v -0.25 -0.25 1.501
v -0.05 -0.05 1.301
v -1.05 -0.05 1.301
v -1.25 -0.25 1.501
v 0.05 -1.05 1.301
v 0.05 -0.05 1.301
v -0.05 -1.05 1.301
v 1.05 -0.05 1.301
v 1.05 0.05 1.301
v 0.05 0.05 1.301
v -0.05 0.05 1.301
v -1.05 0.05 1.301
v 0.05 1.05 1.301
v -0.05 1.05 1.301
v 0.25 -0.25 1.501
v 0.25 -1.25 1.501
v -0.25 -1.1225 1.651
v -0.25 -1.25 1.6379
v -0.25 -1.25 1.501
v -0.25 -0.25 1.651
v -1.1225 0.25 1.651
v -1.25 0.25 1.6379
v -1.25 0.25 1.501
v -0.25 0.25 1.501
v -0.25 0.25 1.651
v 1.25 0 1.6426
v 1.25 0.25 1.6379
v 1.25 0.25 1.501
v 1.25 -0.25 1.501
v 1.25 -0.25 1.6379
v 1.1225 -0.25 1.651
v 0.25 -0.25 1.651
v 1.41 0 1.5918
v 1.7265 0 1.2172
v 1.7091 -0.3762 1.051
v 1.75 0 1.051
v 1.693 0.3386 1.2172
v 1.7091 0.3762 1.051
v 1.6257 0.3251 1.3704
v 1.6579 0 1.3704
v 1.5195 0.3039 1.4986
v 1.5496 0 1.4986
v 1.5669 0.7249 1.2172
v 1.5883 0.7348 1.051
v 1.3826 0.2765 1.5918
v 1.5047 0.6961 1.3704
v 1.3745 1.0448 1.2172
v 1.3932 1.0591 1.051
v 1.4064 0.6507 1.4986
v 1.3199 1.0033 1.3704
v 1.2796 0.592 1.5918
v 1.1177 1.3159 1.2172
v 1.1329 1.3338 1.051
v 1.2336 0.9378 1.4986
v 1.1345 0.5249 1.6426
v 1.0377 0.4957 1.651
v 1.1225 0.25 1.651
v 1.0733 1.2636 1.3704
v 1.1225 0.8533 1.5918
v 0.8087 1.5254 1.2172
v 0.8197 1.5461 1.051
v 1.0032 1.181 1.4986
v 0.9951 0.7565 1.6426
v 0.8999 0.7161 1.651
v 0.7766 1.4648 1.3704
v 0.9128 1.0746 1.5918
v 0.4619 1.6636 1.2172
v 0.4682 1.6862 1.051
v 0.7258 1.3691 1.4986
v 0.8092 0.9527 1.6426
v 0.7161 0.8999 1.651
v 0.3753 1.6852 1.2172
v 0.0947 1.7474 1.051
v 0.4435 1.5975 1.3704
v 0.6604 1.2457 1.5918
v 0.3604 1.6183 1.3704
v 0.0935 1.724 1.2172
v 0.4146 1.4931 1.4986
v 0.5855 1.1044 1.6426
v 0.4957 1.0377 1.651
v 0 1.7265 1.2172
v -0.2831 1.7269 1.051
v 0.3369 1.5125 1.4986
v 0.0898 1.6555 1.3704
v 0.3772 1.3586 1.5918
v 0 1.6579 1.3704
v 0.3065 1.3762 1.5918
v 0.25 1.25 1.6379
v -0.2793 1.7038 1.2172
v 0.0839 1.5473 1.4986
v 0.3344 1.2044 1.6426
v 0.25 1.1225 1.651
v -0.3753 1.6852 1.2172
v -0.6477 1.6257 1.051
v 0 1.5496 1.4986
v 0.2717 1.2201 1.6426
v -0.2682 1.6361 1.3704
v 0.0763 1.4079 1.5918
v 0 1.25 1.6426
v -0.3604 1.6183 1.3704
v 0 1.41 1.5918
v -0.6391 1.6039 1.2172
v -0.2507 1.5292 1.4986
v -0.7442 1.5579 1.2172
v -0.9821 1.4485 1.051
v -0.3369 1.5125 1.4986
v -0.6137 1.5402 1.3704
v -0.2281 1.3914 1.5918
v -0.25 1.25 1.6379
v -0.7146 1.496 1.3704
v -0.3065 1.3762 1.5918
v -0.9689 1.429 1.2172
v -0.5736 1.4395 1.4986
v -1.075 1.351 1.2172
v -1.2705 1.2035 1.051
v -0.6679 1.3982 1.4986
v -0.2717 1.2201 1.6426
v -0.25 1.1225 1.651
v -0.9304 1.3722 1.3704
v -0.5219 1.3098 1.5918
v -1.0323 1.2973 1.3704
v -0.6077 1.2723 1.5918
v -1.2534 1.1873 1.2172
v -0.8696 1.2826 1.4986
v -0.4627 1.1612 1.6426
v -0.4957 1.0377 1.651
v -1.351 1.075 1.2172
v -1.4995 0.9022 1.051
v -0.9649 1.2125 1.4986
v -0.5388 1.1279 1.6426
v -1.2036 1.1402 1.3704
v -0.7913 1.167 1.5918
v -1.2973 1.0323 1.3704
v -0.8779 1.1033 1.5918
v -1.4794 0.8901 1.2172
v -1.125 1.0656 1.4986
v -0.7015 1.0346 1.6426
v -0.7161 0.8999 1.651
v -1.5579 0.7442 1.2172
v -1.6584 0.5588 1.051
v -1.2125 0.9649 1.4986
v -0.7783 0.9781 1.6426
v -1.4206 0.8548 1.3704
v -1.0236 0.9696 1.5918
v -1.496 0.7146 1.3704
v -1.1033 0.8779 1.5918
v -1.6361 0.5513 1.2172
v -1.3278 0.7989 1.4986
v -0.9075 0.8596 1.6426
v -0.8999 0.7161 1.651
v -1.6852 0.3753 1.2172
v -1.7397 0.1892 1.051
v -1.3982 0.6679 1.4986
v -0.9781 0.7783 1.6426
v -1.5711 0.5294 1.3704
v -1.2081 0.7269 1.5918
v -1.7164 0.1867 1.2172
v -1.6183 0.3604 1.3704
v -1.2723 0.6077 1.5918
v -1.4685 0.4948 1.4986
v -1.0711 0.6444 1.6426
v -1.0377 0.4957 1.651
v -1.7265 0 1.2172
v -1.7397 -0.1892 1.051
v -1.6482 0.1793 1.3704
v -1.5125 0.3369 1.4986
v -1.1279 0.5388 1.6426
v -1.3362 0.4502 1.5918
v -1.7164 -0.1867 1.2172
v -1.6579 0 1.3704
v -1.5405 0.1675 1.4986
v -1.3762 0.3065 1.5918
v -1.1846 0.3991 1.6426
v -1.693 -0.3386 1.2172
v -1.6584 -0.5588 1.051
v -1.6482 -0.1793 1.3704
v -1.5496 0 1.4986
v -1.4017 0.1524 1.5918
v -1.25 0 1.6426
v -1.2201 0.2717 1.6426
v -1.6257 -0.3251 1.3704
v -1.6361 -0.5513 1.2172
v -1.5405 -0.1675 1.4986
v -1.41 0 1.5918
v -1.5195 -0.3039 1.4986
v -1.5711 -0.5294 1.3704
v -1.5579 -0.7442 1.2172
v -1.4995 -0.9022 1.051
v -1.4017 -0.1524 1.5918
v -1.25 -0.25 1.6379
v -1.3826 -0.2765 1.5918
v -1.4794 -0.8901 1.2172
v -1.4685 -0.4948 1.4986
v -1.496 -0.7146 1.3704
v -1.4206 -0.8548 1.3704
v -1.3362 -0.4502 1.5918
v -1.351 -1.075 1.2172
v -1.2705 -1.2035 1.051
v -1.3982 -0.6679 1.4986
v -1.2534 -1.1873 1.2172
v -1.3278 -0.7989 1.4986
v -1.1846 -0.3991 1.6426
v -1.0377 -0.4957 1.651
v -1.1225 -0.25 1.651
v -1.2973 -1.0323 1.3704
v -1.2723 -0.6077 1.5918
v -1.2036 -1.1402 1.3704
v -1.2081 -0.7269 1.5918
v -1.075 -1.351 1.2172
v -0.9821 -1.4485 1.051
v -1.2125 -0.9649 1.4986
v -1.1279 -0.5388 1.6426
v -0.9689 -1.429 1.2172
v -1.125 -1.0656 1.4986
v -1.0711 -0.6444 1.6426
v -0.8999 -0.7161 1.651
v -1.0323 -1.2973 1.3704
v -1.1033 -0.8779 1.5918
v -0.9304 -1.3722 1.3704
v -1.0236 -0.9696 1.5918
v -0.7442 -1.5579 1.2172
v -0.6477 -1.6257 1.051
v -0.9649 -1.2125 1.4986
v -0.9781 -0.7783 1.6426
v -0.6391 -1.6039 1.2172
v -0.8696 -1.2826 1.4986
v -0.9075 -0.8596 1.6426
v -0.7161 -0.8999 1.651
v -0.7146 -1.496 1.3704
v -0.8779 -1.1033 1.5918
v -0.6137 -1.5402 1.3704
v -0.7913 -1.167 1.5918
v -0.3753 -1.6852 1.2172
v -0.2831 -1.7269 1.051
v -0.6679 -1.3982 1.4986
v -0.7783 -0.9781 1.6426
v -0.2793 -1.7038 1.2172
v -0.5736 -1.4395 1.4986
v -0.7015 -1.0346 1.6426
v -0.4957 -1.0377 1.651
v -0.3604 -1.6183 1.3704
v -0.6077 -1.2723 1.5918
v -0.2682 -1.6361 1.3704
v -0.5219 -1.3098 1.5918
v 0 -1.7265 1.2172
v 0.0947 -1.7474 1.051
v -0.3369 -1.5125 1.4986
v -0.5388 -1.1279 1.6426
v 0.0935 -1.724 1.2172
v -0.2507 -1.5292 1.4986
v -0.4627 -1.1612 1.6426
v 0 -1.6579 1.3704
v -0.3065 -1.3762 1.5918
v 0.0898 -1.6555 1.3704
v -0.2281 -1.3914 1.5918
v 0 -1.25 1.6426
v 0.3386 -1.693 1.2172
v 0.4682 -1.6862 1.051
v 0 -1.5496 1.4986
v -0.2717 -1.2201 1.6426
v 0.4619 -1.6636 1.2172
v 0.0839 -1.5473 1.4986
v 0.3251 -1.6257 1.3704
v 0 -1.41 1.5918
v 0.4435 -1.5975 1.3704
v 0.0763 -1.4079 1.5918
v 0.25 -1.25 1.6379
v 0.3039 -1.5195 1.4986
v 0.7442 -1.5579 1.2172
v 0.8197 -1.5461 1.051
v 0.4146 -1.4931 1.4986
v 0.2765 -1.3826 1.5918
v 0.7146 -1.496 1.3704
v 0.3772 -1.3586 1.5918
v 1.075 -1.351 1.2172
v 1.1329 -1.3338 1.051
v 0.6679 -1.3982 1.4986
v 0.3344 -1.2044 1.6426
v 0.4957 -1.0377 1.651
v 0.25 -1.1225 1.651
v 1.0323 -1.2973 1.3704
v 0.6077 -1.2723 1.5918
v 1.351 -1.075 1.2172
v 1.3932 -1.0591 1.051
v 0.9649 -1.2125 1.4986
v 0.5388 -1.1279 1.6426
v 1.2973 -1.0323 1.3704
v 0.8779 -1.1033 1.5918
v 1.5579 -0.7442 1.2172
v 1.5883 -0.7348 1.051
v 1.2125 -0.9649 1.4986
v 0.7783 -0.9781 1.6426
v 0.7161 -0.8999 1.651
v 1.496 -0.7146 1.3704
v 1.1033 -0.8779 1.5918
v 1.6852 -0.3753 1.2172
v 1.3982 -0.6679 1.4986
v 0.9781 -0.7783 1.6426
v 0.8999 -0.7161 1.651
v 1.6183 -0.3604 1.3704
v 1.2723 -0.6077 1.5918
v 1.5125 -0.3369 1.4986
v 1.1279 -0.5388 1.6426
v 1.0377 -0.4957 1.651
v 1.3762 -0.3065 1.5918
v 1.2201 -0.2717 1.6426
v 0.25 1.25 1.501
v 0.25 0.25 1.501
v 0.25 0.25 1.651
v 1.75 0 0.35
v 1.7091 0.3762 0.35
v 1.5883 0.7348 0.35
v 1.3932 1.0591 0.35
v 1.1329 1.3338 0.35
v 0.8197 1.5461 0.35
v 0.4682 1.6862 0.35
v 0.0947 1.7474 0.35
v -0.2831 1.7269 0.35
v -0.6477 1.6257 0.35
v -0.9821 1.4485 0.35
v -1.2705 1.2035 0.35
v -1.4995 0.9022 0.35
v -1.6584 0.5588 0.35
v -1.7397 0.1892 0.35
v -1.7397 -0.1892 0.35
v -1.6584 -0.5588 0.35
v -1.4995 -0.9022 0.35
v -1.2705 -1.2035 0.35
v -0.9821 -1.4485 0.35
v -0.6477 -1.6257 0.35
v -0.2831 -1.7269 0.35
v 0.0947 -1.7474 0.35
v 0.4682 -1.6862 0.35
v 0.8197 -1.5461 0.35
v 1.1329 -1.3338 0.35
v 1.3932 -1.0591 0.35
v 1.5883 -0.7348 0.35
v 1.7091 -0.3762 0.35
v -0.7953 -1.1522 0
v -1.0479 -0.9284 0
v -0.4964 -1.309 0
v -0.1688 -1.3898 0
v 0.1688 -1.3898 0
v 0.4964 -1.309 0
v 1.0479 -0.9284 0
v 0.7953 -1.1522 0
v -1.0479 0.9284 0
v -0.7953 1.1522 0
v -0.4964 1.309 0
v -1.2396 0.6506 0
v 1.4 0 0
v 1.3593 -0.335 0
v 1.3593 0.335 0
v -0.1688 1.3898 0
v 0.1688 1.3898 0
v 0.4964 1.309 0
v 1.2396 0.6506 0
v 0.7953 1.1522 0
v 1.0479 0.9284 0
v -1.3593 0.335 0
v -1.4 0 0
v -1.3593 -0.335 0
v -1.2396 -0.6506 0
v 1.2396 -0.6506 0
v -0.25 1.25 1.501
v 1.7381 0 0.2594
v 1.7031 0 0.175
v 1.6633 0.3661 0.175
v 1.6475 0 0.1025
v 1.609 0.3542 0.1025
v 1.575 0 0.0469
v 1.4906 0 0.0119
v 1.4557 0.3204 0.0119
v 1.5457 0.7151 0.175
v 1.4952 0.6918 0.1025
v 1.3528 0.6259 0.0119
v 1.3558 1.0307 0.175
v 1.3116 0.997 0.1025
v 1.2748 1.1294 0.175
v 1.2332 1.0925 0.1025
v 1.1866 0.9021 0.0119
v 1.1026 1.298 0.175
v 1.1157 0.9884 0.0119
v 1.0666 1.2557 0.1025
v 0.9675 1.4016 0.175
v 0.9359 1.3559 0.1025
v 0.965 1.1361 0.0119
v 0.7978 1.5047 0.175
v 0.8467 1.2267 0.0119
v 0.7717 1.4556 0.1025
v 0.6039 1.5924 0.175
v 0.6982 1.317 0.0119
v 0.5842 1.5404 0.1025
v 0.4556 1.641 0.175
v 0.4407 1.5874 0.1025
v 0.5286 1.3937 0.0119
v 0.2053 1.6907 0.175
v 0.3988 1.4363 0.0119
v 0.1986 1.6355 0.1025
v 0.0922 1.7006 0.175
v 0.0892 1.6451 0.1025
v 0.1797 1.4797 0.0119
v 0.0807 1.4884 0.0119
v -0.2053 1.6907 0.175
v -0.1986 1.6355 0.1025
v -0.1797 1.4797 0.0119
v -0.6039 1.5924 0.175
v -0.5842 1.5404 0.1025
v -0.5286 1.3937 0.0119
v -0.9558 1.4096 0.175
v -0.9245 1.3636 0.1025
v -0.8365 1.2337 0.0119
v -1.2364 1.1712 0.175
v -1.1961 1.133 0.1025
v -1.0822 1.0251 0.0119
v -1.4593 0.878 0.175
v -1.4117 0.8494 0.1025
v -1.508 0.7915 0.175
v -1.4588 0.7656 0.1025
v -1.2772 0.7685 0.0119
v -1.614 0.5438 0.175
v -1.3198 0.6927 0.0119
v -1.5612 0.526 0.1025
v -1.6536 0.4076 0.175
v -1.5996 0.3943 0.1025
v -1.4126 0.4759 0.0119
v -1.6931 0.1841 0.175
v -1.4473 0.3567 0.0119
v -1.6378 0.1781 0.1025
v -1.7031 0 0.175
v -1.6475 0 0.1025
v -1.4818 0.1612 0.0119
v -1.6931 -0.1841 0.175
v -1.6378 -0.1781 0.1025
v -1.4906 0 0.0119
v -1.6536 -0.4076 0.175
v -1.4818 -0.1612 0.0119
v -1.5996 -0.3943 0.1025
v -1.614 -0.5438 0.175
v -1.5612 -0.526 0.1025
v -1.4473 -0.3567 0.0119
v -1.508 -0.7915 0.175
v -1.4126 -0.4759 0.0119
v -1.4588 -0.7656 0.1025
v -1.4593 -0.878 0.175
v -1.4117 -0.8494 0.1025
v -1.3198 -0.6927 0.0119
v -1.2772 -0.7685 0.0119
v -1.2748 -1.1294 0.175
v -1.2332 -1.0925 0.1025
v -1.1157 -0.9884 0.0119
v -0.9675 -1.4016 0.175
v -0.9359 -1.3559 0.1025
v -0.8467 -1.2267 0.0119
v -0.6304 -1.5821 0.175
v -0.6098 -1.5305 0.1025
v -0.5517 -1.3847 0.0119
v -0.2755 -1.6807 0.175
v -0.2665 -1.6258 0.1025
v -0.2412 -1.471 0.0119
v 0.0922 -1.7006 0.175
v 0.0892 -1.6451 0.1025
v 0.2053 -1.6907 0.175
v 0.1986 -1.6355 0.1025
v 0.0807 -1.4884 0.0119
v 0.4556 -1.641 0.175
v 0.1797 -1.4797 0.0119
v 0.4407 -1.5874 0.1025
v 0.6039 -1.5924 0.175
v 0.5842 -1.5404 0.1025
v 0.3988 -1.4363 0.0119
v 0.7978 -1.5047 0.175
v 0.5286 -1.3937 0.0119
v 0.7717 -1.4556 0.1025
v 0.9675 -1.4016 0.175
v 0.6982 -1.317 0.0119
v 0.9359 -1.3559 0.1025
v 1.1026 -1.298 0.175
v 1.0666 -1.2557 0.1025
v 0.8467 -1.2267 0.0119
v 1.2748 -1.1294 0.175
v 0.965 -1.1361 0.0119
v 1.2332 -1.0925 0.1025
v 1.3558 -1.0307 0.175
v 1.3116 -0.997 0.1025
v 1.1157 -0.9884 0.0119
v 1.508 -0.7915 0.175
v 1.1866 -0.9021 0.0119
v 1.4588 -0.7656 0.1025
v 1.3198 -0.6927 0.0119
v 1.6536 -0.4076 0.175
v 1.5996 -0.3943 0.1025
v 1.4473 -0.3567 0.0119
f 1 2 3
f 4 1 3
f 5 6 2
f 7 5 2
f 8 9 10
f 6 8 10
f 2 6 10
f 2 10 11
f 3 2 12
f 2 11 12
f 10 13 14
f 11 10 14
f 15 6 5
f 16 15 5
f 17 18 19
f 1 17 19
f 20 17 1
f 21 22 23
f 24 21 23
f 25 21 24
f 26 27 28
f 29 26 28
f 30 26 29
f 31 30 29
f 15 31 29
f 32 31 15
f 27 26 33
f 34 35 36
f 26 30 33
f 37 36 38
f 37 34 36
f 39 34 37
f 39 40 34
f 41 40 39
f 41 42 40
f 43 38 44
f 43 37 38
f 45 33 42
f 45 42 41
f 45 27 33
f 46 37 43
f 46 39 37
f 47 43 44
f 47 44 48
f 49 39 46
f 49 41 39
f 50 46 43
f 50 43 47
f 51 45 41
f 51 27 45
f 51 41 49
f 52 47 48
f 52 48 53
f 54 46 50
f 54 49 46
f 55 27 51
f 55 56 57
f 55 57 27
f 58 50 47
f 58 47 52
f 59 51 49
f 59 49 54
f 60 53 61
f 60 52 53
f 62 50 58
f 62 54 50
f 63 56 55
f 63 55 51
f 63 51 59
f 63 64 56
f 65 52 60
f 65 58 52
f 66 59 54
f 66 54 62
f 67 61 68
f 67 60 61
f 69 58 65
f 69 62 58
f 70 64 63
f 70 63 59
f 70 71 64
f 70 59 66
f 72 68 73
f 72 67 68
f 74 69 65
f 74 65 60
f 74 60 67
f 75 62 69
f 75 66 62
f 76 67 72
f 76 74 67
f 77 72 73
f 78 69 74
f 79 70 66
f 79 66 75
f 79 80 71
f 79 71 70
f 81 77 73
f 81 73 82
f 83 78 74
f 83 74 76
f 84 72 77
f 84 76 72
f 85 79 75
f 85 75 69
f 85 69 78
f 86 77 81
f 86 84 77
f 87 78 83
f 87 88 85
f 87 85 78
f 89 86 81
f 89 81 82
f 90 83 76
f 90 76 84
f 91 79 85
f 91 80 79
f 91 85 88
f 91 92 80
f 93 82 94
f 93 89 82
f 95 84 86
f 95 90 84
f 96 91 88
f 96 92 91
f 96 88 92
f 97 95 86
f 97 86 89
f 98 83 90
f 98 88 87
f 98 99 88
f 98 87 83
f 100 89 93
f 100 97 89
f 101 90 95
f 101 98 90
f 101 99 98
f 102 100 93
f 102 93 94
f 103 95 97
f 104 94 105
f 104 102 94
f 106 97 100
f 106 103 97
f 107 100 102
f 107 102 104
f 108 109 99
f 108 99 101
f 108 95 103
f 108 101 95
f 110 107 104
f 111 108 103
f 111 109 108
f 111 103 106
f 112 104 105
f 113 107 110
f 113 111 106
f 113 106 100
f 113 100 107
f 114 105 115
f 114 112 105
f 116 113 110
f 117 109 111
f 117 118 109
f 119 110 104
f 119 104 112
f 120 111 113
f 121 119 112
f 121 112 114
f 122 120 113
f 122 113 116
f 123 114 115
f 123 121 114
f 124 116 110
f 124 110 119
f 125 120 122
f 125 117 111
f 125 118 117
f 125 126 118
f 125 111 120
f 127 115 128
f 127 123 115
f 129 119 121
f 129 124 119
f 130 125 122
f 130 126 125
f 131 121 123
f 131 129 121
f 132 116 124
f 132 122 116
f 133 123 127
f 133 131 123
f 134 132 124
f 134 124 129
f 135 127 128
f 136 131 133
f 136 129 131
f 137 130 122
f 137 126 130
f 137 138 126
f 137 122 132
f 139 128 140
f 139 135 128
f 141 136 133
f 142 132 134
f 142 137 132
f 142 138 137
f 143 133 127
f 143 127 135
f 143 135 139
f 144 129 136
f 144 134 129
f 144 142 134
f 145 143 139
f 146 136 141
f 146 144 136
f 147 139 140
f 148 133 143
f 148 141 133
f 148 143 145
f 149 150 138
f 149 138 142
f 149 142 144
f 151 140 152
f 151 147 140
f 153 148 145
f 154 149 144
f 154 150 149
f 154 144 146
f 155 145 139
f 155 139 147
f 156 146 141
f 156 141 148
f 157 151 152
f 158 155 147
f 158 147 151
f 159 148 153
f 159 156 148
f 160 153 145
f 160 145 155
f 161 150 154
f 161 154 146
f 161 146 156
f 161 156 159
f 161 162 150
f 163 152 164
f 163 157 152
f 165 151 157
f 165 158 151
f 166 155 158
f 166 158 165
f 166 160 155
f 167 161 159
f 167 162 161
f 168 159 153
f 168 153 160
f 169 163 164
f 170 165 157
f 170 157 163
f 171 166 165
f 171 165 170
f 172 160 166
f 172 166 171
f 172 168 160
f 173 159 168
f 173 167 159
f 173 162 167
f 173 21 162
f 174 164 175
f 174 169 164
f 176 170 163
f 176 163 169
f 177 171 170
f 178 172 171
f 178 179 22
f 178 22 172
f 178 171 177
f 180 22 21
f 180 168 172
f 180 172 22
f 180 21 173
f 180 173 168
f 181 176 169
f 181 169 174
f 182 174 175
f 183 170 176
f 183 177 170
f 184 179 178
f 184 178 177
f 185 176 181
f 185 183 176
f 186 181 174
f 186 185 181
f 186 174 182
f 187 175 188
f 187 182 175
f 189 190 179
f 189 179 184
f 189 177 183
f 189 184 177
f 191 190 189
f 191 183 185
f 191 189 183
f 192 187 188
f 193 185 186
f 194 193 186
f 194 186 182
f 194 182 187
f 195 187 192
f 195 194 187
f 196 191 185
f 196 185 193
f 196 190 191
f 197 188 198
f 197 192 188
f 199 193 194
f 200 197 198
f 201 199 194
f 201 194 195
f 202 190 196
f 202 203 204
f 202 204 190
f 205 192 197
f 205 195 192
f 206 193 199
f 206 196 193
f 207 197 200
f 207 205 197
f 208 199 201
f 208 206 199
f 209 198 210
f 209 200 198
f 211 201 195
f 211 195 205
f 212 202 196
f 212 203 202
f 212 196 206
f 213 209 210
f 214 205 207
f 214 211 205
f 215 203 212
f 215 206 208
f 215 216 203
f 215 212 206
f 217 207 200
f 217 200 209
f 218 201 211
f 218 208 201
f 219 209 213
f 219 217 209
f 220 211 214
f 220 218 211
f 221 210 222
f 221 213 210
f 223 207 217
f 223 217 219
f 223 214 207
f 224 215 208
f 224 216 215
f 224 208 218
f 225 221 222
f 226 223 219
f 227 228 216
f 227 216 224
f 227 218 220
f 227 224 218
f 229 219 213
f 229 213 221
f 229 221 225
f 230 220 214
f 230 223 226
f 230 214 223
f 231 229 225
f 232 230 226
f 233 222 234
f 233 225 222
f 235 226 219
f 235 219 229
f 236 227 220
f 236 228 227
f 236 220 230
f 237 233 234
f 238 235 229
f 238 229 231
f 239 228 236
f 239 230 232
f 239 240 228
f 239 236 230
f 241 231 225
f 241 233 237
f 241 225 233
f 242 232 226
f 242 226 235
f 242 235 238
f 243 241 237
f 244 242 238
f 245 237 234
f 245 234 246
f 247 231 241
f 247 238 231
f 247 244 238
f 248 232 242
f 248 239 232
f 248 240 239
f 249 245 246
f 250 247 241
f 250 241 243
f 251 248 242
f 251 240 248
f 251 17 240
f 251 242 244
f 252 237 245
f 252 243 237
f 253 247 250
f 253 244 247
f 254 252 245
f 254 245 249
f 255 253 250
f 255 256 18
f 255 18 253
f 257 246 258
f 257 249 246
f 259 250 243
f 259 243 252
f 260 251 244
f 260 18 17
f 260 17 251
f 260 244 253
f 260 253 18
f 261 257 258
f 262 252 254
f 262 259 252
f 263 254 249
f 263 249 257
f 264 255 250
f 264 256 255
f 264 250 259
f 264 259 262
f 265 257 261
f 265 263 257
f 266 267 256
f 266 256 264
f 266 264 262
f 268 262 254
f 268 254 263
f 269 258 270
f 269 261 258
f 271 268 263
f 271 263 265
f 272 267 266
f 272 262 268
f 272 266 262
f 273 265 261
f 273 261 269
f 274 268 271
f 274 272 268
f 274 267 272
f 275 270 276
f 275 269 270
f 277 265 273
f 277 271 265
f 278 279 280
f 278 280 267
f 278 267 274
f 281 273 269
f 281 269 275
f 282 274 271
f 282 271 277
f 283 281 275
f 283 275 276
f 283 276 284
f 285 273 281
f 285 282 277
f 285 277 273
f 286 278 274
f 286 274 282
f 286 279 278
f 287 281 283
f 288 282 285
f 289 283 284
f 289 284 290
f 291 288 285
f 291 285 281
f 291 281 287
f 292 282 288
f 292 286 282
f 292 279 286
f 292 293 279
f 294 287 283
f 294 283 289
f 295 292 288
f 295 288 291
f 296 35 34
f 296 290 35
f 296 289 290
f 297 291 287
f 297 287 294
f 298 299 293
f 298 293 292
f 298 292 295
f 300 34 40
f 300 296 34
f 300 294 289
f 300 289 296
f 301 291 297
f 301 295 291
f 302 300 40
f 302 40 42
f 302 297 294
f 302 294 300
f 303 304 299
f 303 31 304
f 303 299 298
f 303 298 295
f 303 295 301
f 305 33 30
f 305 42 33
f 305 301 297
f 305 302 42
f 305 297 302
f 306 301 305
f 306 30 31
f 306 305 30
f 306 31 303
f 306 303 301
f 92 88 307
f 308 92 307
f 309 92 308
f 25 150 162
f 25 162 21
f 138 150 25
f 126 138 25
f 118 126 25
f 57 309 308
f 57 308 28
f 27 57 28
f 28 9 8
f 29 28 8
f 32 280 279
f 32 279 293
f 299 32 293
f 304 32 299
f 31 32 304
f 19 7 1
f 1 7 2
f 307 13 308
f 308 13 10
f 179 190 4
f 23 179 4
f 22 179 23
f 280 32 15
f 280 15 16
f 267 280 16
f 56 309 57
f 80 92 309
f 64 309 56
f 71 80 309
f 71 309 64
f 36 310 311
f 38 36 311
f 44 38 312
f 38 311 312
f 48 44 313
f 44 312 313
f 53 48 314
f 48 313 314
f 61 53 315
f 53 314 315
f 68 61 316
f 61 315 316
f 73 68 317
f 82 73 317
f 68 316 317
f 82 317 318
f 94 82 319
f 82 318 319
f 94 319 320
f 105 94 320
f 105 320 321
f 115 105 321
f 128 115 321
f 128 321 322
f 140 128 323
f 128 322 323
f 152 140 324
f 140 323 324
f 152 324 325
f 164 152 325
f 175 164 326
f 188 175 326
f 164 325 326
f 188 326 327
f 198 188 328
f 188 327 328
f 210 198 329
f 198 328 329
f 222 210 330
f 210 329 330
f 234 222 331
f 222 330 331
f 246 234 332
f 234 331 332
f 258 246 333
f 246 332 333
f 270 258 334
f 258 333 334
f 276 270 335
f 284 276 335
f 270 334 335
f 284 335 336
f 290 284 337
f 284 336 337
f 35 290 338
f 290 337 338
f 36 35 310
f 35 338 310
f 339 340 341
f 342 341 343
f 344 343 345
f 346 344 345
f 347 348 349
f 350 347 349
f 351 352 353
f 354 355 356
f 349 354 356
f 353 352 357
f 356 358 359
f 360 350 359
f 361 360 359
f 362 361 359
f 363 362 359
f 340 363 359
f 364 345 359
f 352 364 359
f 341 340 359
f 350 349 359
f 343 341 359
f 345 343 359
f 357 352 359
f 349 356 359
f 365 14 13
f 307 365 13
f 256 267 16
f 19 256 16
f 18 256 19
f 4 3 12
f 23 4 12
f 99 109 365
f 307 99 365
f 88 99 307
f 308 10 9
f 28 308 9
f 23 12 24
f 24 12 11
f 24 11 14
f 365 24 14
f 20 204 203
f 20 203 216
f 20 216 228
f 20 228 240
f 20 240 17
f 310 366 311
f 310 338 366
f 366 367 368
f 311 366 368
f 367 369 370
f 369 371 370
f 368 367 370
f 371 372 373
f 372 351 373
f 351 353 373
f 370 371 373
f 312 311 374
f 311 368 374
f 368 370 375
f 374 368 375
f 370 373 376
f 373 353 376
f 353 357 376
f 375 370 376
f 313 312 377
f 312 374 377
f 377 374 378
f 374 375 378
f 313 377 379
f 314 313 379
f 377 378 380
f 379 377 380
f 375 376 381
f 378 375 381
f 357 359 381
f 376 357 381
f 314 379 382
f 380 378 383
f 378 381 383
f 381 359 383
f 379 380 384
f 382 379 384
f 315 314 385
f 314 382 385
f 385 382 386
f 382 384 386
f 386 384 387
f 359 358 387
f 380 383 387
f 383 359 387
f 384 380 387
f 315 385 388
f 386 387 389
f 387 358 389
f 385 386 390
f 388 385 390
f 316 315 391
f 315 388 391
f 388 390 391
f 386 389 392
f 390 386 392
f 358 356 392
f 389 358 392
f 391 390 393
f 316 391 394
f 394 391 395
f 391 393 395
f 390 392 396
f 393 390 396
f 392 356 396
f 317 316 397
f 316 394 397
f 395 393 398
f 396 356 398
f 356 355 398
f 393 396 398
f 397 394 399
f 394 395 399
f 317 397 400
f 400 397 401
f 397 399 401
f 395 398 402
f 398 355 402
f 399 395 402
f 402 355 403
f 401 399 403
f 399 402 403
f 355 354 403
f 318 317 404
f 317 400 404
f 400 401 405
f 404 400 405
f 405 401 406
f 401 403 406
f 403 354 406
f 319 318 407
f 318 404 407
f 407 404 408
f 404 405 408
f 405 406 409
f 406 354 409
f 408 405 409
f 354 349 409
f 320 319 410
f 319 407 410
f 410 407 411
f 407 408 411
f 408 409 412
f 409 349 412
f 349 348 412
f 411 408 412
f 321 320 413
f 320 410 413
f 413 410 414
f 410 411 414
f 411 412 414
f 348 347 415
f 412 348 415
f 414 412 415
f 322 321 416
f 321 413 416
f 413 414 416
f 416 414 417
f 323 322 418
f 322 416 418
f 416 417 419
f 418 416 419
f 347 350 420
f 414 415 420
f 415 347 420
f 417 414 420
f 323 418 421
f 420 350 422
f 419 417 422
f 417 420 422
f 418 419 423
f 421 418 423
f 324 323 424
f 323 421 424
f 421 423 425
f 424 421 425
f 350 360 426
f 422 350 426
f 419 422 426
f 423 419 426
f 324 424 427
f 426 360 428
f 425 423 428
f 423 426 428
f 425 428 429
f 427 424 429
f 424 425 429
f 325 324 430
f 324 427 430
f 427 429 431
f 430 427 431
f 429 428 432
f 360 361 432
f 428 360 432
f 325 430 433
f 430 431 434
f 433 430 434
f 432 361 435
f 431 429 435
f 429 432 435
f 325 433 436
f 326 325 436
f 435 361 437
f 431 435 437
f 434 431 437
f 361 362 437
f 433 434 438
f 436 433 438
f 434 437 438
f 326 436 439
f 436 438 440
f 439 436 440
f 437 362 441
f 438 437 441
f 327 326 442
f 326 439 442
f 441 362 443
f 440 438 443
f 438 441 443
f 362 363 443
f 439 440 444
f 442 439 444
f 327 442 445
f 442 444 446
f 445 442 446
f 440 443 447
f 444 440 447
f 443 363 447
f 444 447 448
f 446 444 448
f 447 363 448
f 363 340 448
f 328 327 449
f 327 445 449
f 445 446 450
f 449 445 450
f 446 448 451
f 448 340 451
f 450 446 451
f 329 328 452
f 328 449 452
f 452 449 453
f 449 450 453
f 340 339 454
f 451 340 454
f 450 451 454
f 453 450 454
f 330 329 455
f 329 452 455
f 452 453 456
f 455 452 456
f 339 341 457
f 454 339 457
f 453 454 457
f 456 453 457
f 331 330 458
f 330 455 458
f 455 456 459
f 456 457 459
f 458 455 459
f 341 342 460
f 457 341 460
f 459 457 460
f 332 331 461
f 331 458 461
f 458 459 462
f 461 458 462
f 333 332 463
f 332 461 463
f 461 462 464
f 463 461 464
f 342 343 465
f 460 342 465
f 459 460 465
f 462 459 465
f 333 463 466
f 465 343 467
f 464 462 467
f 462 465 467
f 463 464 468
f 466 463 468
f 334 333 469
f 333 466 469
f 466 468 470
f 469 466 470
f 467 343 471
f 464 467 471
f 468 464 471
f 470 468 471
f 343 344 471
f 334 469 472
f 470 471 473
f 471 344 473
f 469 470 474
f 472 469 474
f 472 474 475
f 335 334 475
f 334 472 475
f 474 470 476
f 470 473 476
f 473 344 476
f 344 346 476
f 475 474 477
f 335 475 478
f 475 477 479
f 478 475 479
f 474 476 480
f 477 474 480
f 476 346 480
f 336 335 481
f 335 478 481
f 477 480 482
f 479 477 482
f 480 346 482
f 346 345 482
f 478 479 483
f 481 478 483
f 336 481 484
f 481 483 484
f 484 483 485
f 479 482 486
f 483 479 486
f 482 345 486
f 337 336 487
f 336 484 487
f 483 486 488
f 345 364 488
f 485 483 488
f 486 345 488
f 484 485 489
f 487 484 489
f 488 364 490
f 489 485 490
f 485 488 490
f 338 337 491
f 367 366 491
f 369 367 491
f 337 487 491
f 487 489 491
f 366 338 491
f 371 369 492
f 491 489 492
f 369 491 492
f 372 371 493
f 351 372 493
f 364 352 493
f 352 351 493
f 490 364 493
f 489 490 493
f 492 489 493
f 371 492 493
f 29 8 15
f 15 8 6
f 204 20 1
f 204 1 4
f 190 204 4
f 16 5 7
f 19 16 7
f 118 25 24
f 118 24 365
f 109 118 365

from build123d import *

# Parameters (mm, degrees)
SKETCH1_R          = 1.75
EXTRUDE1_DEPTH     = 1.651
FILLET1_R          = 0.6
CUT_EXTRUDE2_DEPTH = 0.35
CHAMFER1_SIZE      = 0.2
FILLET2_R          = 0.35


with BuildPart() as part:
    # Sketch1 → Extrude1 (new body)
    with BuildSketch(Plane.XY):
        Circle(SKETCH1_R)
    extrude(amount=EXTRUDE1_DEPTH)

    # Fillet1
    fillet1_edges = [part.edges().sort_by_distance(p)[0] for p in [
        (-1.75, 0, 1.651),
    ]]
    fillet(fillet1_edges, radius=FILLET1_R)

    # Sketch2 → Cut-Extrude2 (cut)
    with BuildSketch(Plane.XY.offset(1.651)):
        Polygon((0.25, -0.25), (0.25, -1.25), (-0.25, -1.25), (-0.25, -0.25), (-1.25, -0.25), (-1.25, 0.25), (-0.25, 0.25), (-0.25, 1.25), (0.25, 1.25), (0.25, 0.25), (1.25, 0.25), (1.25, -0.25), align=None)
    extrude(amount=-CUT_EXTRUDE2_DEPTH, mode=Mode.SUBTRACT)

    # Chamfer1
    chamfer1_edges = [part.edges().sort_by_distance(p)[0] for p in [
        (1.25, 0, 1.301),
        (0.75, 0.25, 1.301),
        (0.25, 0.75, 1.301),
        (0, 1.25, 1.301),
        (-0.25, 0.75, 1.301),
        (-0.75, 0.25, 1.301),
        (-1.25, 0, 1.301),
        (-0.75, -0.25, 1.301),
        (-0.25, -0.75, 1.301),
        (0, -1.25, 1.301),
        (0.25, -0.75, 1.301),
        (0.75, -0.25, 1.301),
    ]]
    chamfer(chamfer1_edges, length=CHAMFER1_SIZE)

    # Fillet2
    fillet2_edges = [part.edges().sort_by_distance(p)[0] for p in [
        (-1.75, 0, 0),
    ]]
    fillet(fillet2_edges, radius=FILLET2_R)


solid = part.part
